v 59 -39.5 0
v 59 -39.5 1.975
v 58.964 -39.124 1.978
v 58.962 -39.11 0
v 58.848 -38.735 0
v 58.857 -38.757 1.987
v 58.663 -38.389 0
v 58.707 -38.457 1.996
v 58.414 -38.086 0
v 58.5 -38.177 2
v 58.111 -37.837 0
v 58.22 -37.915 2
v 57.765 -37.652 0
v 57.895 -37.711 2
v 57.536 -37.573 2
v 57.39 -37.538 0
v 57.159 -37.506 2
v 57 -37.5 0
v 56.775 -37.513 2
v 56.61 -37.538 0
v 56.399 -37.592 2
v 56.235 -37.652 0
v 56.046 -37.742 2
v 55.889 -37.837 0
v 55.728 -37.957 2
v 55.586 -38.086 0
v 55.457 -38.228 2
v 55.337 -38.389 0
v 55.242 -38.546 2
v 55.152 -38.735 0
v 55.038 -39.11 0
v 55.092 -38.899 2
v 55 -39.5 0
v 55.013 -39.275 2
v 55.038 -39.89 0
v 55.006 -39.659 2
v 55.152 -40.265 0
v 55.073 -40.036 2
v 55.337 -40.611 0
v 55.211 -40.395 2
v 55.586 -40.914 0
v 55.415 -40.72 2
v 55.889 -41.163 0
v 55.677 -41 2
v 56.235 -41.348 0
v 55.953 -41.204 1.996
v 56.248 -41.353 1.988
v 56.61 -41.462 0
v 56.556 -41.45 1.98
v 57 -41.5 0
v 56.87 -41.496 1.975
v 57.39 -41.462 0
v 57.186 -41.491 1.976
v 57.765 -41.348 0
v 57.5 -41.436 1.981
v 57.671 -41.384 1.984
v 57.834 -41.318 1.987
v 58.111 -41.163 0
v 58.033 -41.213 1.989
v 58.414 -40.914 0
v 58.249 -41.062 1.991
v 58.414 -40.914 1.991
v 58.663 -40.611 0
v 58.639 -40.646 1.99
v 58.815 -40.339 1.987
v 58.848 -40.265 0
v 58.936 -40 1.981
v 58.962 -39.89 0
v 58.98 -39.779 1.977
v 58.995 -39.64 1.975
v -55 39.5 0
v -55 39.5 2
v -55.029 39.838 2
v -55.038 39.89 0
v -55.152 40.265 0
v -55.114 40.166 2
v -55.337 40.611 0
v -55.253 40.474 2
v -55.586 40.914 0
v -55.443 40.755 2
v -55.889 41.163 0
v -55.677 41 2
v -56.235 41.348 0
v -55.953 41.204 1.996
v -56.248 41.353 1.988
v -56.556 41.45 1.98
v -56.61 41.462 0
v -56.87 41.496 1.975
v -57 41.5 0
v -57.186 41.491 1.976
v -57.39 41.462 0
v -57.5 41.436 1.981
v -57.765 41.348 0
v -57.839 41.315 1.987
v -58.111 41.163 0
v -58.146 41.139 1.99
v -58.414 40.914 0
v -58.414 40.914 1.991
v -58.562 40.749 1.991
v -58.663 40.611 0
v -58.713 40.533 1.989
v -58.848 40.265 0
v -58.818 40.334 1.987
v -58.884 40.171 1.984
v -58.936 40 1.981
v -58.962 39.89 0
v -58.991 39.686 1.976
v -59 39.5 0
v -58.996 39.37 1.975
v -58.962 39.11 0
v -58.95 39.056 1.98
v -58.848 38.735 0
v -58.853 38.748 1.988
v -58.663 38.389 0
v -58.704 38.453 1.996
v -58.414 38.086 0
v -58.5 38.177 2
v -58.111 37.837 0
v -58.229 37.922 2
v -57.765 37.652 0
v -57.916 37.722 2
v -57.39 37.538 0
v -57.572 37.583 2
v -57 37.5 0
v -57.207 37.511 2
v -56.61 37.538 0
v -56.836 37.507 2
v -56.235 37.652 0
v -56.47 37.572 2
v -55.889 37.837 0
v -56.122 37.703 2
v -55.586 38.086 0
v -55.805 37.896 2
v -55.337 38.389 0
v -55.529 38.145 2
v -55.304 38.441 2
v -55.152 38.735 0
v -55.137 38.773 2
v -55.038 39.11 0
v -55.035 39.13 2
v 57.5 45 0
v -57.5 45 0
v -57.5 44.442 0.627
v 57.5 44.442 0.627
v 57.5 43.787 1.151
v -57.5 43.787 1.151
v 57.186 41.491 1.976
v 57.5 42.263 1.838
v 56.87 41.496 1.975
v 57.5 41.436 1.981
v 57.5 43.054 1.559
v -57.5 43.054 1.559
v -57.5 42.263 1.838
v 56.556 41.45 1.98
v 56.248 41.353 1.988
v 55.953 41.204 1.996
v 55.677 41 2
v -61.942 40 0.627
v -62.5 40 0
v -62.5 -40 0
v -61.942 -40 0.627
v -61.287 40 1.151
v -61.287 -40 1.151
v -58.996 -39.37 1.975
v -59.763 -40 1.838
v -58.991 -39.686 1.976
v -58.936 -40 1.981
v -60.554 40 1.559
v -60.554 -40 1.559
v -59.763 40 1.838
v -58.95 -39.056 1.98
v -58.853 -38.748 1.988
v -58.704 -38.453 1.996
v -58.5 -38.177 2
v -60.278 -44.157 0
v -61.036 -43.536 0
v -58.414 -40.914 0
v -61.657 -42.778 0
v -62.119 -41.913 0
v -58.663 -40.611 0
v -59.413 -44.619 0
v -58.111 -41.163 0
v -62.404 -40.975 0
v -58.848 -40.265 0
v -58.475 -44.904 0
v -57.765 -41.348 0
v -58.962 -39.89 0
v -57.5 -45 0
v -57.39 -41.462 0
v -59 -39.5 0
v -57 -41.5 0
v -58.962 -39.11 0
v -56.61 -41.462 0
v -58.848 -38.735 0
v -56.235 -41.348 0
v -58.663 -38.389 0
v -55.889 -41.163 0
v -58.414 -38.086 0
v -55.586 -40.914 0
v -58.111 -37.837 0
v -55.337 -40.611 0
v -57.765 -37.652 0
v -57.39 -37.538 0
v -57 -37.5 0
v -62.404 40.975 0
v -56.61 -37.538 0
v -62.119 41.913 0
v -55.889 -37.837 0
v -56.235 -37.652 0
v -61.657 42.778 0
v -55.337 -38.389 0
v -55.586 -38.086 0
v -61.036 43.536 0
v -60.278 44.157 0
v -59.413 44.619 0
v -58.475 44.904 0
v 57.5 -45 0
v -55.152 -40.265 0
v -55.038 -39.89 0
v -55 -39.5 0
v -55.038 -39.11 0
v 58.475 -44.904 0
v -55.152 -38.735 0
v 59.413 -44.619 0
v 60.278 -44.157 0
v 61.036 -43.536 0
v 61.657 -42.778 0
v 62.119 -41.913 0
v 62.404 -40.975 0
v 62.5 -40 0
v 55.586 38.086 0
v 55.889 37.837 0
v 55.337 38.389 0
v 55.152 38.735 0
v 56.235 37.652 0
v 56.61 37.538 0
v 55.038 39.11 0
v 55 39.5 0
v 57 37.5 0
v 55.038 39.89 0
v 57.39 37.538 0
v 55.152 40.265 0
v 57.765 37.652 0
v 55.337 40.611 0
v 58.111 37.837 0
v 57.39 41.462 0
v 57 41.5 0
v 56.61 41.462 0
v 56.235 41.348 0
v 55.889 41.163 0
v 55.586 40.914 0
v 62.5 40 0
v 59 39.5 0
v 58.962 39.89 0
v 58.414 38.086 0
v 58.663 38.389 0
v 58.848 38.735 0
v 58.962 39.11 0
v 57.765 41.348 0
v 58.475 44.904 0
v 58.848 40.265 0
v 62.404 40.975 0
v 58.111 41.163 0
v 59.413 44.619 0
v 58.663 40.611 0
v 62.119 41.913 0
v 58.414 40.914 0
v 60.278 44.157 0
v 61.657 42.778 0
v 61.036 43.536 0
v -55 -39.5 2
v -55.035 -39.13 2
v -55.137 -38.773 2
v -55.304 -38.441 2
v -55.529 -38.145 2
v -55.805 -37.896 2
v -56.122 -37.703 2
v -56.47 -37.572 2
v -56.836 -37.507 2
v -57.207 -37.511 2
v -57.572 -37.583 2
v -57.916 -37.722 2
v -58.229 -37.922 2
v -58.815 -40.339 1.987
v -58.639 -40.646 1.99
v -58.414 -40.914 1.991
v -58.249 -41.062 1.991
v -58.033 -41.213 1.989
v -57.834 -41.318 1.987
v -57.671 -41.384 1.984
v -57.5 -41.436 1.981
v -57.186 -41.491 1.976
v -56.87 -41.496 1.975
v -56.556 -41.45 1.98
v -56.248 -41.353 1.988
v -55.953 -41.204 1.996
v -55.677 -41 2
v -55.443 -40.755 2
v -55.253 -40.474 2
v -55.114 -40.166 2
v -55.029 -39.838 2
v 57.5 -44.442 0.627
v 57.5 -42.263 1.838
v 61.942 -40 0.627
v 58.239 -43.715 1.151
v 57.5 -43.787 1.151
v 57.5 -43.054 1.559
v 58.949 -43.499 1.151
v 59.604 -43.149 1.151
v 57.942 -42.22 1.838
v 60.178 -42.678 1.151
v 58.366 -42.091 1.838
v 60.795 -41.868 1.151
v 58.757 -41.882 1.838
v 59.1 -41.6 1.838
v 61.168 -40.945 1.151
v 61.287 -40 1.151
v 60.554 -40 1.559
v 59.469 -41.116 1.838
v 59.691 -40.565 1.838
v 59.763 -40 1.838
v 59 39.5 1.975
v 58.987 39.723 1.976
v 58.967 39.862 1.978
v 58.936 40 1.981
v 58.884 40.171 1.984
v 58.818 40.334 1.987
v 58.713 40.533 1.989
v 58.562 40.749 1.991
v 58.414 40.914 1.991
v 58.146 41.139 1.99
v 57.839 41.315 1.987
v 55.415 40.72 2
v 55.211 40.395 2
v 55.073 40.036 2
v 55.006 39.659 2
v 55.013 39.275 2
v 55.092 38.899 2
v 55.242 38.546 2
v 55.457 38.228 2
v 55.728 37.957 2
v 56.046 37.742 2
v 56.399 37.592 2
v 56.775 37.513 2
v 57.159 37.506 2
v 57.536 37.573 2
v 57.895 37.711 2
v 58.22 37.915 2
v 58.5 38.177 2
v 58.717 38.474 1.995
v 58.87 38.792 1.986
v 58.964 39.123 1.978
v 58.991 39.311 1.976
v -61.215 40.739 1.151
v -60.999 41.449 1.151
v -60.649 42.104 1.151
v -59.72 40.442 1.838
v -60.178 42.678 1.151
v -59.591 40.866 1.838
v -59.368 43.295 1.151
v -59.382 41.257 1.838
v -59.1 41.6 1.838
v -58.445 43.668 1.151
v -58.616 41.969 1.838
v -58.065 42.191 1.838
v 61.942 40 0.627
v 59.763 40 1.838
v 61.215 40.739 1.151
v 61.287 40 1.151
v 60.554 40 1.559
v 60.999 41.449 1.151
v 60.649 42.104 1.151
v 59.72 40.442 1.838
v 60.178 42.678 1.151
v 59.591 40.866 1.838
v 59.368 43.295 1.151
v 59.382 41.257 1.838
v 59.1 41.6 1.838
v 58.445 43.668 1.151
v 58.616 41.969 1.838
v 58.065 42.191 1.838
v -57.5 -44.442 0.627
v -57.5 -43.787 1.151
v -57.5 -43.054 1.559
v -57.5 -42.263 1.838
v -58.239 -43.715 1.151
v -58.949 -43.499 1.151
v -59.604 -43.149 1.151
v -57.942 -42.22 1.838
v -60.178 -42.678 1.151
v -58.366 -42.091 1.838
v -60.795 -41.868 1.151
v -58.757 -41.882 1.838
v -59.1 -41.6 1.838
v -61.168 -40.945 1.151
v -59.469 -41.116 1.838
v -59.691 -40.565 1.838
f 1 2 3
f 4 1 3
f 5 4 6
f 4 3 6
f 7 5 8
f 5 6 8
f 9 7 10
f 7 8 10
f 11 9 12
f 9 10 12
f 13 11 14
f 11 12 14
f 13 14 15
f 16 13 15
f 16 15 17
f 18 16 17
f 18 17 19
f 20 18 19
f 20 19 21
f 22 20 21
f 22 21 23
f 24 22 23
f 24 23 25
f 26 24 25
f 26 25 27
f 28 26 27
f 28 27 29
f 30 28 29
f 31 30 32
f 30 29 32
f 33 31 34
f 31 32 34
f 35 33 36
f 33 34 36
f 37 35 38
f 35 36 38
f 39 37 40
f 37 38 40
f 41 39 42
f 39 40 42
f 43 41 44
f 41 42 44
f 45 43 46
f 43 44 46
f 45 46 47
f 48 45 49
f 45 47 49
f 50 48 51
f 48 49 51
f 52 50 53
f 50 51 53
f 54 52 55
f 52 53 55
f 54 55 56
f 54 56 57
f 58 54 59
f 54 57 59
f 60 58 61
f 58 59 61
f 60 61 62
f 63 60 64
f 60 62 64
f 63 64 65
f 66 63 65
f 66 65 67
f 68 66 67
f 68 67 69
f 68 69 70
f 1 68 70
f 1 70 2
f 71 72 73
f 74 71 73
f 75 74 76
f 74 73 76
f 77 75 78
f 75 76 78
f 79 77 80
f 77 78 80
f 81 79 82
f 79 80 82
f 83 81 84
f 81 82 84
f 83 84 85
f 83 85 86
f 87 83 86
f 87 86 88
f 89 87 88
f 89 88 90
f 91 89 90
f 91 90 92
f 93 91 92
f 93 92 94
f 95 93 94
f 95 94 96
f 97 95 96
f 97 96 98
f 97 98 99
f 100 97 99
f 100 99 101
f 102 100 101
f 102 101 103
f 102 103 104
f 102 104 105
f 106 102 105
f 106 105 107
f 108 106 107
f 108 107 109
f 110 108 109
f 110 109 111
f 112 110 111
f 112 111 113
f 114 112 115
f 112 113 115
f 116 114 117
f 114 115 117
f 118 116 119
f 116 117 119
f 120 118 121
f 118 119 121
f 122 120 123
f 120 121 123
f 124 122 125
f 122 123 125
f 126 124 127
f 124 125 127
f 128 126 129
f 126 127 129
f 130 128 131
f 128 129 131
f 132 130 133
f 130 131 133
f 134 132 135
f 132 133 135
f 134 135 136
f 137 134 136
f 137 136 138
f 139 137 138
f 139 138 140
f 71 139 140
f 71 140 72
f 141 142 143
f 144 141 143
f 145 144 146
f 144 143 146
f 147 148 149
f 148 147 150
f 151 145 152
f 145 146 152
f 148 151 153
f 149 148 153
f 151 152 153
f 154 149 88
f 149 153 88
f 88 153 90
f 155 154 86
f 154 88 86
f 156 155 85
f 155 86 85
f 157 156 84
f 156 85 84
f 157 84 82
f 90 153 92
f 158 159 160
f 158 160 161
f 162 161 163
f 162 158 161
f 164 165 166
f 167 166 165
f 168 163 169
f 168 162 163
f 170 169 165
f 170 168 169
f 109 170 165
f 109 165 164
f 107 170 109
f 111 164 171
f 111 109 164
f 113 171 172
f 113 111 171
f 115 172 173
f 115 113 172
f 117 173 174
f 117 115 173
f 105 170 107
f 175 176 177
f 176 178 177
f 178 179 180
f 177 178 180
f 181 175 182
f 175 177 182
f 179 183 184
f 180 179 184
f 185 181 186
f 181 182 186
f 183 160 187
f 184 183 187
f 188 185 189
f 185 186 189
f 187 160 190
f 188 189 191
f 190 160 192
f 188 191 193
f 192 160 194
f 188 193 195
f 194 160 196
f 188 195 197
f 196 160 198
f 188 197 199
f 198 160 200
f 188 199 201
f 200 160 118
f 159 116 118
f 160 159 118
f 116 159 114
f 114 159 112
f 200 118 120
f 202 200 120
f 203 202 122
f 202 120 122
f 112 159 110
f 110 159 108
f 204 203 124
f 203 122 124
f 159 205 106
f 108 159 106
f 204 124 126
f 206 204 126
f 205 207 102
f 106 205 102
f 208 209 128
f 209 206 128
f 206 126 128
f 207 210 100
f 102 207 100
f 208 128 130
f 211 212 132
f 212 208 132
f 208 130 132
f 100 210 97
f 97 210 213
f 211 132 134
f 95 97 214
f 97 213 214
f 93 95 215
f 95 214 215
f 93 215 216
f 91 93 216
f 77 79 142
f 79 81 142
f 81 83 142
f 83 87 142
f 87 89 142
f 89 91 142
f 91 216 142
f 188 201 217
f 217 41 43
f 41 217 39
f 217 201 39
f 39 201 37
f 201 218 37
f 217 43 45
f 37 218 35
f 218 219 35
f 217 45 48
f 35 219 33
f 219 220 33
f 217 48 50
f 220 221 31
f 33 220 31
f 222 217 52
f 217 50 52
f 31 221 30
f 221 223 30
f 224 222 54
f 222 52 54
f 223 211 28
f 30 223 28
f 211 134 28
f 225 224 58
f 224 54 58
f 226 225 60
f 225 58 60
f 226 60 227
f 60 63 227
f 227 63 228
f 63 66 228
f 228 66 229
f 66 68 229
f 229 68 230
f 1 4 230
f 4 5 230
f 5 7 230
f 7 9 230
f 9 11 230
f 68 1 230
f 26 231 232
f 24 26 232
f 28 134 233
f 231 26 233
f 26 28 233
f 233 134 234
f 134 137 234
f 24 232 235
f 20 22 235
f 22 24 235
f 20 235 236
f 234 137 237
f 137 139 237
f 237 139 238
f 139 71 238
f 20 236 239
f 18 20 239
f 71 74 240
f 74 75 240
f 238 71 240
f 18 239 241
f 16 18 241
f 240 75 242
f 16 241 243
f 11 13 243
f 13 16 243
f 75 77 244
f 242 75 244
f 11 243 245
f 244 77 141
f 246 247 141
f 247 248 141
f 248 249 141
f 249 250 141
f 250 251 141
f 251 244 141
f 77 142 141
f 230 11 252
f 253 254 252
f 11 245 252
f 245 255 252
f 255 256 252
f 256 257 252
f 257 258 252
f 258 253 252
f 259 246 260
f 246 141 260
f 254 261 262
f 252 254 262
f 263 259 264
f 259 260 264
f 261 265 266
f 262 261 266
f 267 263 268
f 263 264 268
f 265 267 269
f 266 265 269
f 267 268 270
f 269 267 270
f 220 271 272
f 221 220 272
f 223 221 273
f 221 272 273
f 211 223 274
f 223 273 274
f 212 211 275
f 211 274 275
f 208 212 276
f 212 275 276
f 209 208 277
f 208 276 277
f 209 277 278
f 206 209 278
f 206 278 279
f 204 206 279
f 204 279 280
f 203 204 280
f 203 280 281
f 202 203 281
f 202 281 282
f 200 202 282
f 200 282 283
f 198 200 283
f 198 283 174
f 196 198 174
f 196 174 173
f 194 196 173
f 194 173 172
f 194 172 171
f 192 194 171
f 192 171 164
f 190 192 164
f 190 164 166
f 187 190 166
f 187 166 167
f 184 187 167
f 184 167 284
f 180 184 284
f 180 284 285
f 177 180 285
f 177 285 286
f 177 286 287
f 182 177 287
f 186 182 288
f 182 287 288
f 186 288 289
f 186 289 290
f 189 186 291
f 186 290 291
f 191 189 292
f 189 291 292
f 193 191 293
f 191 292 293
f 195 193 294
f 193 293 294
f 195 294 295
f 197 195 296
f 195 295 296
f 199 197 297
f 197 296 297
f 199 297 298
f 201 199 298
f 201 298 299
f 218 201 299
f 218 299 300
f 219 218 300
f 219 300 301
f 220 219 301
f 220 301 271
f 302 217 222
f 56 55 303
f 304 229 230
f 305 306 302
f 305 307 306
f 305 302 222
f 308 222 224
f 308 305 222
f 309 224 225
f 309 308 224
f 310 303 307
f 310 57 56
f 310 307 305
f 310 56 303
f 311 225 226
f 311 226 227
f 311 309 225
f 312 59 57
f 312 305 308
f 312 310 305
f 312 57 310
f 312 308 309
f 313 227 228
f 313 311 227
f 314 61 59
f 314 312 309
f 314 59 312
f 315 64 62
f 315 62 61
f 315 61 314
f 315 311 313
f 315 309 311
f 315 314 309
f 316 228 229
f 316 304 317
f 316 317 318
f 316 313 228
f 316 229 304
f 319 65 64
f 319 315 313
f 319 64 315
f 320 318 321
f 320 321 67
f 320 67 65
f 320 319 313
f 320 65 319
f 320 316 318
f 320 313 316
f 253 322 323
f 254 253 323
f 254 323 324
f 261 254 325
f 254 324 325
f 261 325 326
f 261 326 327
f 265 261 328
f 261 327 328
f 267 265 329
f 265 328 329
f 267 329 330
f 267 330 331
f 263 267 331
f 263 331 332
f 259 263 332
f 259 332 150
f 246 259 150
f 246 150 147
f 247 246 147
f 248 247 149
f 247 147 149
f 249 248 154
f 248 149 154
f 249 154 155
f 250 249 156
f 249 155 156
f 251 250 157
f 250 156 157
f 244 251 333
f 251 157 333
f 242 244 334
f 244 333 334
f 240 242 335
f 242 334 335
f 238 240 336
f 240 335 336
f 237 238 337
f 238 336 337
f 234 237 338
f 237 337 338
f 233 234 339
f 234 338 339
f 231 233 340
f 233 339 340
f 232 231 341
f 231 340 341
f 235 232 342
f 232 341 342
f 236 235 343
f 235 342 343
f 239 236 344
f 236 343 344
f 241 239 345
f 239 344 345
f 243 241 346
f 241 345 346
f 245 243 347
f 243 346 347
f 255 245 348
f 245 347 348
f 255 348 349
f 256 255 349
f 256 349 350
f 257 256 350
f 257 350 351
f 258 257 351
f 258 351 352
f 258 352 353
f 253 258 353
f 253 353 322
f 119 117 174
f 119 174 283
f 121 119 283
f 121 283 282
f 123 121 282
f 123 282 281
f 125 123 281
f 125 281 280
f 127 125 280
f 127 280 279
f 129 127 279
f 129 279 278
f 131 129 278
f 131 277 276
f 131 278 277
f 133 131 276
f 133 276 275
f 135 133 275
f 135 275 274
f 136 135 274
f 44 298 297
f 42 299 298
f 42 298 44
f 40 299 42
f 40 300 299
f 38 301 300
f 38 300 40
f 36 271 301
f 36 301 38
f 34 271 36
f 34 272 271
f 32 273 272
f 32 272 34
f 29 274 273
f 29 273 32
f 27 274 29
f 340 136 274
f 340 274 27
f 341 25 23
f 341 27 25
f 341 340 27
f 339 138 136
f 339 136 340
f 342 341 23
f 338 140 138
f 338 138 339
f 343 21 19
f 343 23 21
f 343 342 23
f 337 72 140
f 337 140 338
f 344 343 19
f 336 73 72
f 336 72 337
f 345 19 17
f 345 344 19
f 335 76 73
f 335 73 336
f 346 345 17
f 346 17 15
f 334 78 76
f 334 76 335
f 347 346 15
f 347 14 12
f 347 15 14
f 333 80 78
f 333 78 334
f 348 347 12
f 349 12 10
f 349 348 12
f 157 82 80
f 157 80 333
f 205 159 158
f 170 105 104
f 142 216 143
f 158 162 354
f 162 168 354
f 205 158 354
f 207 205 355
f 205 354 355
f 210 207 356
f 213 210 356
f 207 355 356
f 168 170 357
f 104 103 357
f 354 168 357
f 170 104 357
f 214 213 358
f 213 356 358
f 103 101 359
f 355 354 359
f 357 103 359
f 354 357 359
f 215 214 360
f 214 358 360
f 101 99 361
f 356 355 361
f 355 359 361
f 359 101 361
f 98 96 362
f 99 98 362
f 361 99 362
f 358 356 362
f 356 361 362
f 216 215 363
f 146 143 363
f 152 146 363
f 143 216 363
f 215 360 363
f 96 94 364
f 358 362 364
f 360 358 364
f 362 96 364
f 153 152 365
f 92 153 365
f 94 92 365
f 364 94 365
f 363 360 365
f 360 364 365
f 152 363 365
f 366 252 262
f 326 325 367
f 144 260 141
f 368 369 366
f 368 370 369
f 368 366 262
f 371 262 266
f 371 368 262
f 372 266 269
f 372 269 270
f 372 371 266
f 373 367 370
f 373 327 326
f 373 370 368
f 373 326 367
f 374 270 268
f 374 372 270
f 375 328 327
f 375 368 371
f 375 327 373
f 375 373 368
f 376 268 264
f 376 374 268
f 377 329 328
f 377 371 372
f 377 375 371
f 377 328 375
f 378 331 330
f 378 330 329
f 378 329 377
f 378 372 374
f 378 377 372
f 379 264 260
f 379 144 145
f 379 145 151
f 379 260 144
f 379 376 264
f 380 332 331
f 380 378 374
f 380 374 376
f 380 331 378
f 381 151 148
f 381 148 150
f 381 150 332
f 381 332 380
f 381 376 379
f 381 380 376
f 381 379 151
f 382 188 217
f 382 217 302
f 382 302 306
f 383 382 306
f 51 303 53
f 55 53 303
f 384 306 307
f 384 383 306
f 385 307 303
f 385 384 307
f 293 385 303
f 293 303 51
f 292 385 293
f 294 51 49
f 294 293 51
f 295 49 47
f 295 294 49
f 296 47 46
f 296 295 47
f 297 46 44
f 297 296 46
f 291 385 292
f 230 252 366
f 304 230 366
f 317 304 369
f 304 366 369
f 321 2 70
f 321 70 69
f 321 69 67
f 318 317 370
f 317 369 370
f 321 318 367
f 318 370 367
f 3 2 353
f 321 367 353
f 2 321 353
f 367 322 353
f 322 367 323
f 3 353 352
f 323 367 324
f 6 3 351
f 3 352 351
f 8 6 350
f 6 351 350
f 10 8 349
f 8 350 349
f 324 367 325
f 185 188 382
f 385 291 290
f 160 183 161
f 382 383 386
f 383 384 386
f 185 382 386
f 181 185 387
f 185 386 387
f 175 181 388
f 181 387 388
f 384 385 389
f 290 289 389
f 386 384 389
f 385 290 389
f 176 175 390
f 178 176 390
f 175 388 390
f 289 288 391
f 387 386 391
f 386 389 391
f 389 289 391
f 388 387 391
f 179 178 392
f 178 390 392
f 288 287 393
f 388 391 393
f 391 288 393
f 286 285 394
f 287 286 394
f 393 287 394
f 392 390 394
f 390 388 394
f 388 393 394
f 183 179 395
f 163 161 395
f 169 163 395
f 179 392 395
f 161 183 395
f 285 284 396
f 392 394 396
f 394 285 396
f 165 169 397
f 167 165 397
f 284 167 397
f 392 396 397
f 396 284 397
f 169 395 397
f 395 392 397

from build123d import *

# Parameters (mm, degrees)
F1_DEPTH     = 2
F0_W         = 2
F0_H         = 68
F0_W_2       = 103
F0_H_2       = 2
F2_DEPTH     = 2
F3_R         = 2
F4_DEPTH     = 5
F5_R         = 5
F6_T1_DEPTH  = 80
F6_T3_DEPTH  = 115
F6_T6_ANGLE  = 90
F6_T8_ANGLE  = 90
F6_T10_ANGLE = 90
F6_T12_ANGLE = 90


# Not quite as in the source:
# - a fillet or chamfer that OpenCascade refuses, or shapes differently, is made with other operations: its cross-section is extruded or revolved along the edge and cut away or added


with BuildPart() as f1:
    # F0 (on Top) → F1 (new body)
    with BuildSketch(Plane.XY):
        Polygon((-51.5, -43), (51.5, -43), (51.5, -34), (60.5, -34), (60.5, 34), (51.5, 34), (51.5, 43), (-51.5, 43), (-51.5, 34), (-60.5, 34), (-60.5, -34), (-51.5, -34), align=None)
    extrude(amount=F1_DEPTH)

    # F0 (on Top) → F2 (join)
    with BuildSketch(Plane.XY):
        Polygon((-62.5, -45), (-51.5, -45), (-51.5, -43), (-51.5, -34), (-60.5, -34), (-62.5, -34), align=None)
        with Locations((-61.5, 0)):
            Rectangle(F0_W, F0_H)
        with Locations((0, -44)):
            Rectangle(F0_W_2, F0_H_2)
        Polygon((51.5, -45), (62.5, -45), (62.5, -34), (60.5, -34), (51.5, -34), (51.5, -43), align=None)
        with Locations((61.5, 0)):
            Rectangle(F0_W, F0_H)
        Polygon((60.5, 34), (62.5, 34), (62.5, 45), (51.5, 45), (51.5, 43), (51.5, 34), align=None)
        with Locations((0, 44)):
            Rectangle(F0_W_2, F0_H_2)
        Polygon((-62.5, 45), (-62.5, 34), (-60.5, 34), (-51.5, 34), (-51.5, 43), (-51.5, 45), align=None)
    extrude(amount=F2_DEPTH)

    # F3 (on face) → F4 (cut)
    with BuildSketch(Plane.XY.offset(2)):
        with Locations((-57, -39.5)):
            Circle(F3_R)
        with Locations((57, -39.5)):
            Circle(F3_R)
        with Locations((-57, 39.5)):
            Circle(F3_R)
        with Locations((57, 39.5)):
            Circle(F3_R)
    extrude(amount=-F4_DEPTH, mode=Mode.SUBTRACT)

    # F5
    f5_edges = [f1.edges().sort_by_distance(p)[0] for p in [
        (-62.5, 45, 1),
        (62.5, 45, 1),
        (62.5, -45, 1),
        (-62.5, -45, 1),
    ]]
    fillet(f5_edges, radius=F5_R)

    # F6: fillet of radius 5 on 1 edges, made by hand

    # F6_s2 → F6_t1 (cut)
    with BuildSketch(Plane.XZ.offset(-40)):
        with BuildLine():
            ThreePointArc((-62.5, 0), (-60.7360679775, 1.472135955), (-58.5, 2))
            Line((-58.5, 2), (-62.5, 2))
            Line((-62.5, 2), (-62.5, 0))
        make_face()
        with BuildLine():
            ThreePointArc((62.5, 0), (60.7360679775, 1.472135955), (58.5, 2))
            Line((58.5, 2), (62.5, 2))
            Line((62.5, 2), (62.5, 0))
        make_face()
    extrude(amount=F6_T1_DEPTH, mode=Mode.SUBTRACT)

    # F6_s4 → F6_t3 (cut)
    with BuildSketch(Plane.YZ.offset(-57.5)):
        with BuildLine():
            ThreePointArc((-45, 0), (-43.2360679775, 1.472135955), (-41, 2))
            Line((-41, 2), (-45, 2))
            Line((-45, 2), (-45, 0))
        make_face()
        with BuildLine():
            ThreePointArc((45, 0), (43.2360679775, 1.472135955), (41, 2))
            Line((41, 2), (45, 2))
            Line((45, 2), (45, 0))
        make_face()
    extrude(amount=F6_T3_DEPTH, mode=Mode.SUBTRACT)

    # F6_s5 → F6_t6 (revolve, cut)
    with BuildSketch(Plane.XZ.offset(-40)):
        with BuildLine():
            ThreePointArc((-62.5, 0), (-60.7360679775, 1.472135955), (-58.5, 2))
            Line((-58.5, 2), (-62.5, 2))
            Line((-62.5, 2), (-62.5, 0))
        make_face()
    revolve(axis=Axis((-57.5, 40, 2), (0, 0, -1)), revolution_arc=F6_T6_ANGLE, mode=Mode.SUBTRACT)

    # F6_s7 → F6_t8 (revolve, cut)
    with BuildSketch(Plane.YZ.offset(-57.5)):
        with BuildLine():
            ThreePointArc((-45, 0), (-43.2360679775, 1.472135955), (-41, 2))
            Line((-41, 2), (-45, 2))
            Line((-45, 2), (-45, 0))
        make_face()
    revolve(axis=Axis((-57.5, -40, 2), (0, 0, -1)), revolution_arc=F6_T8_ANGLE, mode=Mode.SUBTRACT)

    # F6_s9 → F6_t10 (revolve, cut)
    with BuildSketch(Plane.YZ.offset(57.5)):
        with BuildLine():
            ThreePointArc((-45, 0), (-43.2360679775, 1.472135955), (-41, 2))
            Line((-41, 2), (-45, 2))
            Line((-45, 2), (-45, 0))
        make_face()
    revolve(axis=Axis((57.5, -40, 2), (0, 0, 1)), revolution_arc=F6_T10_ANGLE, mode=Mode.SUBTRACT)

    # F6_s11 → F6_t12 (revolve, cut)
    with BuildSketch(Plane.XZ.offset(-40)):
        with BuildLine():
            ThreePointArc((62.5, 0), (60.7360679775, 1.472135955), (58.5, 2))
            Line((58.5, 2), (62.5, 2))
            Line((62.5, 2), (62.5, 0))
        make_face()
    revolve(axis=Axis((57.5, 40, 2), (0, 0, 1)), revolution_arc=F6_T12_ANGLE, mode=Mode.SUBTRACT)


solid = f1.part
